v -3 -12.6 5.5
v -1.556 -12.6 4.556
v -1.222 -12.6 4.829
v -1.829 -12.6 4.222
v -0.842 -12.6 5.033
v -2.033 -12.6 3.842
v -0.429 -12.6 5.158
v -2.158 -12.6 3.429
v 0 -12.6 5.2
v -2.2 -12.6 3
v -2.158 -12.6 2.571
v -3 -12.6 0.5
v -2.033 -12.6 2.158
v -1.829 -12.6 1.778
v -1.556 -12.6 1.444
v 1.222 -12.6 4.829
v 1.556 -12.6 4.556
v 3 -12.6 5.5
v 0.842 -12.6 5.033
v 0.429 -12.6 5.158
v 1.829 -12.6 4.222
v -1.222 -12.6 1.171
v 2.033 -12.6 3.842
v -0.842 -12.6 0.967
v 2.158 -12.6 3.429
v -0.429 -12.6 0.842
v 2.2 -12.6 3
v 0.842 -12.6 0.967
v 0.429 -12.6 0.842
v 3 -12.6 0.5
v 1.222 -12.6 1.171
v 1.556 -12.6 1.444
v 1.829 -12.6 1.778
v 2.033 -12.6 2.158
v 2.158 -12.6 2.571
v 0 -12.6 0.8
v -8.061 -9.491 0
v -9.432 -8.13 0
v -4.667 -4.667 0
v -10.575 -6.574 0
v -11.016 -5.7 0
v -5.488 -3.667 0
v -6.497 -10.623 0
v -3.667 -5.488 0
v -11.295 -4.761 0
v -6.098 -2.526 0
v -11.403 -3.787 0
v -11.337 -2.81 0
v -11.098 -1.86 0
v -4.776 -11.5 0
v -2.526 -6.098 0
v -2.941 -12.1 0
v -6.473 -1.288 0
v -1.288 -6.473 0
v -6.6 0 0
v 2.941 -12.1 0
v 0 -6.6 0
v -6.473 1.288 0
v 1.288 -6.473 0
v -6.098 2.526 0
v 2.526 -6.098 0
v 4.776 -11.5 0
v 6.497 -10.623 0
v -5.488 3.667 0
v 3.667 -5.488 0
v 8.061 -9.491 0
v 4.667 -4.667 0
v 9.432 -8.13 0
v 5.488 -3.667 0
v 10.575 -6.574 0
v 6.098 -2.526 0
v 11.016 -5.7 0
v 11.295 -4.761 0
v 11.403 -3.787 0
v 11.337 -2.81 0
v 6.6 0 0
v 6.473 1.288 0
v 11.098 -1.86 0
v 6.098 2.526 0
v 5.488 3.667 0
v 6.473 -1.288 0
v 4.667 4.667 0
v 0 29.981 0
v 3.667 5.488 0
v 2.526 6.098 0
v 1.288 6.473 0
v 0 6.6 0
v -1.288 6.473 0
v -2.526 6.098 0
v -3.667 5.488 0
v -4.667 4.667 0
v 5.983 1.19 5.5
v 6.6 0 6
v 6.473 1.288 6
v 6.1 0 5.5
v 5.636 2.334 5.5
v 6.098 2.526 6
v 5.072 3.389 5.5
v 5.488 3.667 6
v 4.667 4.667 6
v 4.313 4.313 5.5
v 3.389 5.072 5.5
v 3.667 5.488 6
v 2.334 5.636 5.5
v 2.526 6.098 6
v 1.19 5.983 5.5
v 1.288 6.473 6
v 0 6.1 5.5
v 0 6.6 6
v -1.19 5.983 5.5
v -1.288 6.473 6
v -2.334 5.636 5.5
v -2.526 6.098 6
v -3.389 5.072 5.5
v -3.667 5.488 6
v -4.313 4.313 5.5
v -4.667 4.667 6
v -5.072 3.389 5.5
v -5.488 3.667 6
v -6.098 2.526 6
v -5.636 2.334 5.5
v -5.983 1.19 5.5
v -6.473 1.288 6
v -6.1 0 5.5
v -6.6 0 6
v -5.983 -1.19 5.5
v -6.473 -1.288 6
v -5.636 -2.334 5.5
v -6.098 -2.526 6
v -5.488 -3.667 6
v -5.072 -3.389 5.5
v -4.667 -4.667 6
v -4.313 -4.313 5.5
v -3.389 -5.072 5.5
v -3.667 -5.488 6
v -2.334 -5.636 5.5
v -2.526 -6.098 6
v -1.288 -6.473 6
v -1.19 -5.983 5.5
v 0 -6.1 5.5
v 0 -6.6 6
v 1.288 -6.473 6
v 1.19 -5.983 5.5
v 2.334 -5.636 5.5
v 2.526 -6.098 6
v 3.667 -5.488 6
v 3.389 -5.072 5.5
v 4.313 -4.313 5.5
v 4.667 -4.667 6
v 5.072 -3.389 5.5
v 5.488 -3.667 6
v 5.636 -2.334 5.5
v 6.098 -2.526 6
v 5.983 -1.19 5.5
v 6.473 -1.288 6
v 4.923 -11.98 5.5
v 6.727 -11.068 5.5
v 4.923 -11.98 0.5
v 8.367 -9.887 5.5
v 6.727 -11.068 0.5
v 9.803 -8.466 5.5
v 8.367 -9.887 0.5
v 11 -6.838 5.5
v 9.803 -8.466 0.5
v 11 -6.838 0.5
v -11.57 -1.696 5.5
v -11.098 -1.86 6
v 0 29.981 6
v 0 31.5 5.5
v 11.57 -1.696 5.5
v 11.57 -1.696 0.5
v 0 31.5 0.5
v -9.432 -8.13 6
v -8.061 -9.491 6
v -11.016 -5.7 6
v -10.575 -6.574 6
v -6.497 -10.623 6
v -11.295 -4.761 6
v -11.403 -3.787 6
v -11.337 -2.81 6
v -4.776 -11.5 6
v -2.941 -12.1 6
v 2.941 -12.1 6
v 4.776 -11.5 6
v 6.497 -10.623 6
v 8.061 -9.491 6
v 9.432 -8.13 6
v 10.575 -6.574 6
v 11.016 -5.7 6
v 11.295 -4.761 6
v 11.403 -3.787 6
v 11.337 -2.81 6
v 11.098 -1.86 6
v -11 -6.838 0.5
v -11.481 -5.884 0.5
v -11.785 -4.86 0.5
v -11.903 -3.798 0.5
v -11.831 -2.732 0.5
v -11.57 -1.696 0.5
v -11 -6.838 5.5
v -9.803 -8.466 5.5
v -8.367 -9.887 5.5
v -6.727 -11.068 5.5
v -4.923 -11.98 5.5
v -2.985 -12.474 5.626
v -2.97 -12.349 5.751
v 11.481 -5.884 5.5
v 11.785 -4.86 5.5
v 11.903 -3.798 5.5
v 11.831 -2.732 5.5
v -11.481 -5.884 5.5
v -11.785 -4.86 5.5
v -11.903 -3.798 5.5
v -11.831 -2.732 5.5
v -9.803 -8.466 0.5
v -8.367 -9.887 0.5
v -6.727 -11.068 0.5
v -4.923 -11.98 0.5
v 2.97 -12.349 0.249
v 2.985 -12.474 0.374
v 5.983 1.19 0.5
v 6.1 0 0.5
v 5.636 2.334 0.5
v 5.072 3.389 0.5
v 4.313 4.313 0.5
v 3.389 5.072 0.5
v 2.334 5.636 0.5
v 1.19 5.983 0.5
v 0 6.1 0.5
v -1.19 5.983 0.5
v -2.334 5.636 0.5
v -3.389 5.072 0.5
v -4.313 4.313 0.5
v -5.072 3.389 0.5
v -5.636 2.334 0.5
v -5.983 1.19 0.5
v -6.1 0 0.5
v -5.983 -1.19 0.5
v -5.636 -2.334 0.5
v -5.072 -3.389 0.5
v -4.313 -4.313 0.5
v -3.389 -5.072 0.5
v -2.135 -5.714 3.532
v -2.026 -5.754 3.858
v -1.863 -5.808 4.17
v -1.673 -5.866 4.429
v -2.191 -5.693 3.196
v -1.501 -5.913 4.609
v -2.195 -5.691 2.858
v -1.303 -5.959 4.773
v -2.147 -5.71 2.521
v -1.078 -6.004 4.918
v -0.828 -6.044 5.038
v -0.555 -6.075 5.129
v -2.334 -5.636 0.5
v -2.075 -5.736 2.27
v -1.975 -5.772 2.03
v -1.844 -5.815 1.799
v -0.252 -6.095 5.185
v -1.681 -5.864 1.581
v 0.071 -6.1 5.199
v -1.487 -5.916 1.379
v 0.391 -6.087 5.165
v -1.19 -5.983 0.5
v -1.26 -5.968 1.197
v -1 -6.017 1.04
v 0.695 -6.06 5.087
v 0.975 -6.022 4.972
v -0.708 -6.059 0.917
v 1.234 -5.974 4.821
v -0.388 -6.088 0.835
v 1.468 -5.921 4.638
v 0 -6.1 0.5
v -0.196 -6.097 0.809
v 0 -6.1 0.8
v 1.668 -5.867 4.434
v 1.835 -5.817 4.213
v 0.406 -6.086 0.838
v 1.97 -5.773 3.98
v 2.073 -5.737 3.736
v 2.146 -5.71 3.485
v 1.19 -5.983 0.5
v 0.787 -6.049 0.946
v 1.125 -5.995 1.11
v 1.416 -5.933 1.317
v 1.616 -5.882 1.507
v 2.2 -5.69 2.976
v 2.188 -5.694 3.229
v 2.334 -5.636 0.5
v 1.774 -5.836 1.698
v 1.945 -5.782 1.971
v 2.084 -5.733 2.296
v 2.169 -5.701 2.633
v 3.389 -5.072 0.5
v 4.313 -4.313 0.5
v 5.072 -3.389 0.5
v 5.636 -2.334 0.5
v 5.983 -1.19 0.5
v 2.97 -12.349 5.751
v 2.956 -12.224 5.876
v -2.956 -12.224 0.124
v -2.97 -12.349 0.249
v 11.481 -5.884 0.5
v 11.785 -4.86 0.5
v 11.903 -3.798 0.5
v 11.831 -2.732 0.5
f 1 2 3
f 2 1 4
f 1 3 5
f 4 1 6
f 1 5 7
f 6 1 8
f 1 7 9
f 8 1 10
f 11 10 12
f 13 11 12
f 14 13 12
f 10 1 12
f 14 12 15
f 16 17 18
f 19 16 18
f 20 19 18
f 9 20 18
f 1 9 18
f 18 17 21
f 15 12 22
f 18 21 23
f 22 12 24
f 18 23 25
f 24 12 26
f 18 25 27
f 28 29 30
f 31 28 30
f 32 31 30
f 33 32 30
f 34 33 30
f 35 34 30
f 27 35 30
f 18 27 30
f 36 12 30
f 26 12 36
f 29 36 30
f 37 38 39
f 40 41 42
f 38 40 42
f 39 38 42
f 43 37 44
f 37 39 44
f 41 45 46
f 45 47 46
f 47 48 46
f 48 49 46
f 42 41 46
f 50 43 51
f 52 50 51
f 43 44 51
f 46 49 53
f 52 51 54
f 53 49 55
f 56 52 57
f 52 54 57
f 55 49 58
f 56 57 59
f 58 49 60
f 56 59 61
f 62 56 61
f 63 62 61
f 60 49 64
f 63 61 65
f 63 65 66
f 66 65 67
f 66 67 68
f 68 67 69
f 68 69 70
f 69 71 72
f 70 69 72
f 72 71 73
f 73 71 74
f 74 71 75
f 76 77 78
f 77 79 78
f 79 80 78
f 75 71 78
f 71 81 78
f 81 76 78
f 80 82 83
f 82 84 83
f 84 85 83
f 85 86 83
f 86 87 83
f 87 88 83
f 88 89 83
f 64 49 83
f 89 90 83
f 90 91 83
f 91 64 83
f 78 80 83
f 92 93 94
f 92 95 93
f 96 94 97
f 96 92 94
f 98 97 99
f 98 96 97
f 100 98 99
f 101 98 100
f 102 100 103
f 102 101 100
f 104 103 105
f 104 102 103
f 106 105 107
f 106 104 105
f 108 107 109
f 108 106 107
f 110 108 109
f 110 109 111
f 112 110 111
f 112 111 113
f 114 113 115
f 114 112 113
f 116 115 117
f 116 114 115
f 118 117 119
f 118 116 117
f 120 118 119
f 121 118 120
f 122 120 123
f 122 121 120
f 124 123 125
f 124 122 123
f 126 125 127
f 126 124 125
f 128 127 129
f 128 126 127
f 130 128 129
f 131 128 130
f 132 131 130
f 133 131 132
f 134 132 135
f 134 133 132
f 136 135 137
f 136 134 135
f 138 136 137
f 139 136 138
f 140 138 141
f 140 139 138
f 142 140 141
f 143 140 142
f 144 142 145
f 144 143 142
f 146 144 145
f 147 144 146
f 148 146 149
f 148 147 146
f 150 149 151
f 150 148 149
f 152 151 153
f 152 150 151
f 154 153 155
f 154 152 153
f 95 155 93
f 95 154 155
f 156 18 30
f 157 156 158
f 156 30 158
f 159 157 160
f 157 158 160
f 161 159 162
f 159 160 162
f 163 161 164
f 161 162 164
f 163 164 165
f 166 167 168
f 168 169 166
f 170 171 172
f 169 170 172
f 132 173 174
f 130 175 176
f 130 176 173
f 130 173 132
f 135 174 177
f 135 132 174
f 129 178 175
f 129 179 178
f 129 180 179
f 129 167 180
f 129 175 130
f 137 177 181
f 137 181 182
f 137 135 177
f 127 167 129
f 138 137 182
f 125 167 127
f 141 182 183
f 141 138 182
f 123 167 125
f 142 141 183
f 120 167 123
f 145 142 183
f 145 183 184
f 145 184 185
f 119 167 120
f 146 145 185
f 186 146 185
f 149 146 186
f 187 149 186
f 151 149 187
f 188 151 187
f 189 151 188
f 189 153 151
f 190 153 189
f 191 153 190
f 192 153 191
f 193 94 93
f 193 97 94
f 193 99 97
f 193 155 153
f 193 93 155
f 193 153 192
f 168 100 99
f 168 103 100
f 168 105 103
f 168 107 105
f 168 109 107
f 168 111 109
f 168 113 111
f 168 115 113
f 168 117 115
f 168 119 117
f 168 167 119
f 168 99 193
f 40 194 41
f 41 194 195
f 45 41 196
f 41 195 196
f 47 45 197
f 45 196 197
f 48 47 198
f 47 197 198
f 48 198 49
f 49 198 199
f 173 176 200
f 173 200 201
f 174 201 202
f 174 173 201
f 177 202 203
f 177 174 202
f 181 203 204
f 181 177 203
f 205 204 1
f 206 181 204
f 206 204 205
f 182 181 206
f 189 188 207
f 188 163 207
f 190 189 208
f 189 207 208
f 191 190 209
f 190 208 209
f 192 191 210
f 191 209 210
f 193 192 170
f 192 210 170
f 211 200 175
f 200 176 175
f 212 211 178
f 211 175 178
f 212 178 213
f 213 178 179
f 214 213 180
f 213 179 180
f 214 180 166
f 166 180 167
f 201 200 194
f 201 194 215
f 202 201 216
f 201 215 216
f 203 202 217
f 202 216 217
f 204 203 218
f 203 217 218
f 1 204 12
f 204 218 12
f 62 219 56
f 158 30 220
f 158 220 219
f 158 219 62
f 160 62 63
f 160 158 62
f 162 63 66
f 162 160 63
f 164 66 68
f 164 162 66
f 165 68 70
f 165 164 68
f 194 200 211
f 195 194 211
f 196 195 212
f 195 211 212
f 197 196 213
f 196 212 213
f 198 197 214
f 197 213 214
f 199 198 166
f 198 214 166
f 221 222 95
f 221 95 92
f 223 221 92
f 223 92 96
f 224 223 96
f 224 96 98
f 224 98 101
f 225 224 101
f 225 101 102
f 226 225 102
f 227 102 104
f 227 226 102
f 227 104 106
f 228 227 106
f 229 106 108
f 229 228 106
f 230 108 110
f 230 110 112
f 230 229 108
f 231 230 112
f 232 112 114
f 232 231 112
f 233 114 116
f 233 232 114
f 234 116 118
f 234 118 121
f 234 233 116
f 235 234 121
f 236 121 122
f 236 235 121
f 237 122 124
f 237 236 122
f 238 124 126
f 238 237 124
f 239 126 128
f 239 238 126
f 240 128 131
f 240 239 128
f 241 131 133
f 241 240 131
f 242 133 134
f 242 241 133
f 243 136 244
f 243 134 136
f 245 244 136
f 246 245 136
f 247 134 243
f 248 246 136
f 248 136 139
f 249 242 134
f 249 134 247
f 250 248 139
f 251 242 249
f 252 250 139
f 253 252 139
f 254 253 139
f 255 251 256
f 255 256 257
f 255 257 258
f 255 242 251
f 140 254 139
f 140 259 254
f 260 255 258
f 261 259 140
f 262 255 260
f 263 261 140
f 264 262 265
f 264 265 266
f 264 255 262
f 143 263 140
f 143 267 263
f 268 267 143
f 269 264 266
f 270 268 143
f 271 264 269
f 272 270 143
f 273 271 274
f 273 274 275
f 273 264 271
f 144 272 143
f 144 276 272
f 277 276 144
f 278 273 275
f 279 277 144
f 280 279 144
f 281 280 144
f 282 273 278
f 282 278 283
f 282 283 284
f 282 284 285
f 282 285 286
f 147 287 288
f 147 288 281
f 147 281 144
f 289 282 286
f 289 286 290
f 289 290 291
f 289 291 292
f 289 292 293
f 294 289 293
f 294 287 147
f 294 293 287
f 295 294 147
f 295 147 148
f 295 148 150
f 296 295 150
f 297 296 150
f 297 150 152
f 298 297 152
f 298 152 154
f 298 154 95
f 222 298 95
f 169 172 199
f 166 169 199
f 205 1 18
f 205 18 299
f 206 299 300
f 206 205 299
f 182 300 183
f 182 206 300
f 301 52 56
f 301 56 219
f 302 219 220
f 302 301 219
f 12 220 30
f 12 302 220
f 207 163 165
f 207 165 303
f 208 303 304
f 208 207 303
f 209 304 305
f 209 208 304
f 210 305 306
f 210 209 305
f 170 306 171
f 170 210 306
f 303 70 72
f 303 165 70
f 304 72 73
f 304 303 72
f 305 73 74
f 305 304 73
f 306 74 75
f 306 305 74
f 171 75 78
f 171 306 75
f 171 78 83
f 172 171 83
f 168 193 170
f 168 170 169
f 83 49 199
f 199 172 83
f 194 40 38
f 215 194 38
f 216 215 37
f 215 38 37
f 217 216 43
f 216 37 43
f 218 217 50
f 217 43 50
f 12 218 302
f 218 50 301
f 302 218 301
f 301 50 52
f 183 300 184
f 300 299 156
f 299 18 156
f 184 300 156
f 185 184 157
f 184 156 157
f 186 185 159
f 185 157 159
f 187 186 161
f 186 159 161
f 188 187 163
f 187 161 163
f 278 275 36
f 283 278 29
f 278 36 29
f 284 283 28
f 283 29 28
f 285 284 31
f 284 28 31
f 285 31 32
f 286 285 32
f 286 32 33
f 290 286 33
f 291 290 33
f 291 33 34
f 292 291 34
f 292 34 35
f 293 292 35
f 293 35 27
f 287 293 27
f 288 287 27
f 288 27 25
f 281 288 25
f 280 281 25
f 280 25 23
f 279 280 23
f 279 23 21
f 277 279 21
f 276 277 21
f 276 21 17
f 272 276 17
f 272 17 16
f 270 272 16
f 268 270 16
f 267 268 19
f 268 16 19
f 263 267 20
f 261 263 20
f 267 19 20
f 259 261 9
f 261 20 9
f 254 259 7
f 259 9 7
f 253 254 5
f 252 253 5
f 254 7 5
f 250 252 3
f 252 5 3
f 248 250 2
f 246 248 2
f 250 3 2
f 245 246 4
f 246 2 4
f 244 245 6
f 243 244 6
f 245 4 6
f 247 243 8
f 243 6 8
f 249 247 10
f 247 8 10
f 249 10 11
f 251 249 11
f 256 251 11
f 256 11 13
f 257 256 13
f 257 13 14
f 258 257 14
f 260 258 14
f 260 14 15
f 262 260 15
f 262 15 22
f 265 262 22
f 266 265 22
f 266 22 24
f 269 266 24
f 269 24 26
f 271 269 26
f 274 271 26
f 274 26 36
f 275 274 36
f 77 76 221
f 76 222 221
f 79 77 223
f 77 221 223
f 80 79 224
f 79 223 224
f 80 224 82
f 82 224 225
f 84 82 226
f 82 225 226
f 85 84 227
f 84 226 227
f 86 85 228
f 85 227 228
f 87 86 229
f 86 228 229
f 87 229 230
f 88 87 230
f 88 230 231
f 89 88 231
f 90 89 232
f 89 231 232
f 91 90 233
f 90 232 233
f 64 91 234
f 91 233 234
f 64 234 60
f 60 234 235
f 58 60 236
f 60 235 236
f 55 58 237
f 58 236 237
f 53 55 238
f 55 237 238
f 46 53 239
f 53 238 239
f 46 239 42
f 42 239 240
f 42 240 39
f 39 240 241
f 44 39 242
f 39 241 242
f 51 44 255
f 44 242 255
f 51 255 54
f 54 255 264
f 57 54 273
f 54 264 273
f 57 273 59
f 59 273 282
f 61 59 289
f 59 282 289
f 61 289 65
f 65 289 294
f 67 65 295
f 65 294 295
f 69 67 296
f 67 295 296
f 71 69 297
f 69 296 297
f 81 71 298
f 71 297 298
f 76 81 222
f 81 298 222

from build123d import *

# Parameters (mm, degrees)
SKIZZE1_R                            = 6.1
AUFSATZ_LINEAR_AUSTRAGEN1_DEPTH      = 6
SCHNITT_LINEAR_AUSTRAGEN1_REACH      = 48.187
SCHNITT_LINEAR_AUSTRAGEN1_END_RADIUS = 6.1
SKIZZE2_R                            = 2.2
VERRUNDUNG1_R                        = 6
FASE1_SIZE                           = 0.5


with BuildPart() as part:
    # Skizze1 → Aufsatz-Linear austragen1 (new body)
    with BuildSketch(Plane.XY):
        with BuildLine():
            Line((-3, -12.6), (3, -12.6))
            ThreePointArc((3, -12.6), (8.815176648, -9.489608035), (12.34506932, -3.919089625))
            Line((12.34506932, -3.919089625), (0, 31.5))
            Line((0, 31.5), (-12.34506932, -3.919089625))
            ThreePointArc((-12.34506932, -3.919089625), (-8.815176648, -9.489608035), (-3, -12.6))
        make_face()
        Circle(SKIZZE1_R, mode=Mode.SUBTRACT)
    extrude(amount=AUFSATZ_LINEAR_AUSTRAGEN1_DEPTH)

    # Schnitt-Linear austragen1: up to this cylinder (the profile starts outside it)
    schnitt_linear_austragen1_end = Plane(origin=(0, 0, 3), z_dir=(0, 0, -1)) * Cylinder(SCHNITT_LINEAR_AUSTRAGEN1_END_RADIUS, 109.574, mode=Mode.PRIVATE)
    # Skizze2 → Schnitt-Linear austragen1 (cut, up to the surface)
    with BuildSketch(Plane.XZ.offset(12.6), mode=Mode.PRIVATE) as schnitt_linear_austragen1_sk1:
        with Locations(Location((0, 3, 0), (0, 0, 270))):
            Circle(SKIZZE2_R)
    schnitt_linear_austragen1_tool1 = extrude(schnitt_linear_austragen1_sk1.sketch, amount=-SCHNITT_LINEAR_AUSTRAGEN1_REACH, mode=Mode.PRIVATE) - schnitt_linear_austragen1_end
    add(schnitt_linear_austragen1_tool1.solids().sort_by_distance((0, -12.6, 3))[0], mode=Mode.SUBTRACT)

    # Verrundung1
    verrundung1_edges = [part.edges().sort_by_distance(p)[0] for p in [
        (-12.34506932, -3.919089625, 3),
        (12.34506932, -3.919089625, 3),
    ]]
    fillet(verrundung1_edges, radius=VERRUNDUNG1_R)

    # Fase1
    # the kernel refuses this chamfer: 0.5 mm, written as the material it takes off along each edge
    with BuildSketch(Plane(origin=(0, 0, 6), x_dir=(0.1340527924962947, -0.9909741918051879, 0), z_dir=(-0.9909741918051879, -0.1340527924962947, 0))) as fase1_piece_1:
        Polygon((12.952219887 - FASE1_SIZE, 0), (12.952219887, -FASE1_SIZE), (12.952219887, 0), align=None)
    revolve(axis=Axis((0, 0, 6), (0, 0, 1)), revolution_arc=50.429560745, mode=Mode.SUBTRACT)
    with BuildSketch(Plane(origin=(0, 0, 0), x_dir=(1, 0, 0), z_dir=(0, -1, 0))) as fase1_piece_2:
        Polygon((6.1 + FASE1_SIZE, 0), (6.1, FASE1_SIZE), (6.1, 0), align=None)
    revolve(axis=Axis((0, 0, 0), (0, 0, 1)), mode=Mode.SUBTRACT)
    with BuildSketch(Plane(origin=(0, 0, 6), x_dir=(1, 0, 0), z_dir=(0, -1, 0))) as fase1_piece_3:
        Polygon((6.1 + FASE1_SIZE, 0), (6.1, -FASE1_SIZE), (6.1, 0), align=None)
    revolve(axis=Axis((0, 0, 6), (0, 0, 1)), mode=Mode.SUBTRACT)
    with BuildSketch(Plane(origin=(0.423201699, 32.714202895, 6), x_dir=(0.9439295829747817, -0.32899987713443074, 0.0274958766105856), z_dir=(-0.32912431347143534, -0.9442866017697998, 0)), Plane(origin=(11.570098829, -1.695631129, 6), x_dir=(-0.9439295829747814, -0.32899987713443096, 0.027495876610585616), z_dir=(-0.32912431347143556, 0.9442866017697997, 0))) as fase1_piece_4:
        Polygon((FASE1_SIZE * 0.999621916911, -FASE1_SIZE * 0.0274958766106), (-FASE1_SIZE * 0.0274958766106, -FASE1_SIZE * 0.999621916911), (0, 0), align=None)
    extrude(amount=36.440032041, mode=Mode.SUBTRACT)
    with BuildSketch(Plane(origin=(11.570098829, -1.695631129, 0), x_dir=(-0.9439295829747814, -0.32899987713443096, -0.02749587661058635), z_dir=(-0.32912431347143556, 0.9442866017697997, 0)), Plane(origin=(0.423201699, 32.714202895, 0), x_dir=(0.9439295829747817, -0.32899987713443074, -0.027495876610586334), z_dir=(-0.32912431347143534, -0.9442866017697998, 0))) as fase1_piece_5:
        Polygon((FASE1_SIZE * 0.999621916911, FASE1_SIZE * 0.0274958766106), (-FASE1_SIZE * 0.0274958766106, FASE1_SIZE * 0.999621916911), (0, 0), align=None)
    extrude(amount=36.440032041, mode=Mode.SUBTRACT)
    with BuildSketch(Plane(origin=(0, 0, 0), x_dir=(-0.8492796998321288, -0.5279431706661704, 0), z_dir=(-0.5279431706661704, 0.8492796998321288, 0))) as fase1_piece_6:
        Polygon((12.952219887, FASE1_SIZE), (12.952219887 - FASE1_SIZE, 0), (12.952219887, 0), align=None)
    revolve(axis=Axis((0, 0, 0), (0, 0, 1)), revolution_arc=50.429560745, mode=Mode.SUBTRACT)
    with BuildSketch(Plane(origin=(-5.904379219, -3.67037701, 0), x_dir=(-0.849279699832129, -0.5279431706661702, 0), z_dir=(0.5279431706661702, -0.849279699832129, 0))) as fase1_piece_7:
        Polygon((6 - FASE1_SIZE, 0), (6, -FASE1_SIZE), (6, 0), align=None)
    revolve(axis=Axis((-5.904379219, -3.67037701, 0), (0, 0, -1)), revolution_arc=51.08222172, mode=Mode.SUBTRACT)
    with BuildSketch(Plane(origin=(5.904379219, -3.67037701, 0), x_dir=(0.8492796998321291, -0.5279431706661698, 0), z_dir=(-0.5279431706661698, -0.8492796998321291, 0))) as fase1_piece_8:
        Polygon((6 - FASE1_SIZE, 0), (6, FASE1_SIZE), (6, 0), align=None)
    revolve(axis=Axis((5.904379219, -3.67037701, 0), (0, 0, 1)), revolution_arc=51.08222172, mode=Mode.SUBTRACT)
    with BuildSketch(Plane(origin=(0, 0, 6), x_dir=(-0.8492796998321288, -0.5279431706661704, 0), z_dir=(-0.5279431706661704, 0.8492796998321288, 0))) as fase1_piece_9:
        Polygon((12.952219887, -FASE1_SIZE), (12.952219887 - FASE1_SIZE, 0), (12.952219887, 0), align=None)
    revolve(axis=Axis((0, 0, 6), (0, 0, 1)), revolution_arc=50.429560745, mode=Mode.SUBTRACT)
    with BuildSketch(Plane(origin=(-5.904379219, -3.67037701, 6), x_dir=(-0.849279699832129, -0.5279431706661702, 0), z_dir=(0.5279431706661702, -0.849279699832129, 0))) as fase1_piece_10:
        Polygon((6, FASE1_SIZE), (6 - FASE1_SIZE, 0), (6, 0), align=None)
    revolve(axis=Axis((-5.904379219, -3.67037701, 6), (0, 0, -1)), revolution_arc=51.08222172, mode=Mode.SUBTRACT)
    with BuildSketch(Plane(origin=(5.904379219, -3.67037701, 6), x_dir=(0.8492796998321291, -0.5279431706661698, 0), z_dir=(-0.5279431706661698, -0.8492796998321291, 0))) as fase1_piece_11:
        Polygon((6 - FASE1_SIZE, 0), (6, -FASE1_SIZE), (6, 0), align=None)
    revolve(axis=Axis((5.904379219, -3.67037701, 6), (0, 0, 1)), revolution_arc=51.08222172, mode=Mode.SUBTRACT)
    with BuildSketch(Plane(origin=(0, 0, 0), x_dir=(0.13405279249629465, -0.9909741918051879, 0), z_dir=(-0.9909741918051879, -0.13405279249629465, 0))) as fase1_piece_12:
        Polygon((12.952219887 - FASE1_SIZE, 0), (12.952219887, FASE1_SIZE), (12.952219887, 0), align=None)
    revolve(axis=Axis((0, 0, 0), (0, 0, 1)), revolution_arc=50.429560745, mode=Mode.SUBTRACT)
    with BuildSketch(Plane(origin=(-4.285841494, -12.6, 0), x_dir=(0, 0.9996219169112968, -0.02749587661058644), z_dir=(1, 0, 0)), Plane(origin=(-4.285841494, -12.6, 6), x_dir=(0, -0.027495876610585647, -0.9996219169112968), z_dir=(1, 0, 0))) as fase1_piece_13:
        Polygon((FASE1_SIZE * 0.999621916911, FASE1_SIZE * 0.0274958766106), (-FASE1_SIZE * 0.0274958766106, FASE1_SIZE * 0.999621916911), (0, 0), align=None)
    extrude(amount=8.571682988, mode=Mode.SUBTRACT)


solid = part.part
